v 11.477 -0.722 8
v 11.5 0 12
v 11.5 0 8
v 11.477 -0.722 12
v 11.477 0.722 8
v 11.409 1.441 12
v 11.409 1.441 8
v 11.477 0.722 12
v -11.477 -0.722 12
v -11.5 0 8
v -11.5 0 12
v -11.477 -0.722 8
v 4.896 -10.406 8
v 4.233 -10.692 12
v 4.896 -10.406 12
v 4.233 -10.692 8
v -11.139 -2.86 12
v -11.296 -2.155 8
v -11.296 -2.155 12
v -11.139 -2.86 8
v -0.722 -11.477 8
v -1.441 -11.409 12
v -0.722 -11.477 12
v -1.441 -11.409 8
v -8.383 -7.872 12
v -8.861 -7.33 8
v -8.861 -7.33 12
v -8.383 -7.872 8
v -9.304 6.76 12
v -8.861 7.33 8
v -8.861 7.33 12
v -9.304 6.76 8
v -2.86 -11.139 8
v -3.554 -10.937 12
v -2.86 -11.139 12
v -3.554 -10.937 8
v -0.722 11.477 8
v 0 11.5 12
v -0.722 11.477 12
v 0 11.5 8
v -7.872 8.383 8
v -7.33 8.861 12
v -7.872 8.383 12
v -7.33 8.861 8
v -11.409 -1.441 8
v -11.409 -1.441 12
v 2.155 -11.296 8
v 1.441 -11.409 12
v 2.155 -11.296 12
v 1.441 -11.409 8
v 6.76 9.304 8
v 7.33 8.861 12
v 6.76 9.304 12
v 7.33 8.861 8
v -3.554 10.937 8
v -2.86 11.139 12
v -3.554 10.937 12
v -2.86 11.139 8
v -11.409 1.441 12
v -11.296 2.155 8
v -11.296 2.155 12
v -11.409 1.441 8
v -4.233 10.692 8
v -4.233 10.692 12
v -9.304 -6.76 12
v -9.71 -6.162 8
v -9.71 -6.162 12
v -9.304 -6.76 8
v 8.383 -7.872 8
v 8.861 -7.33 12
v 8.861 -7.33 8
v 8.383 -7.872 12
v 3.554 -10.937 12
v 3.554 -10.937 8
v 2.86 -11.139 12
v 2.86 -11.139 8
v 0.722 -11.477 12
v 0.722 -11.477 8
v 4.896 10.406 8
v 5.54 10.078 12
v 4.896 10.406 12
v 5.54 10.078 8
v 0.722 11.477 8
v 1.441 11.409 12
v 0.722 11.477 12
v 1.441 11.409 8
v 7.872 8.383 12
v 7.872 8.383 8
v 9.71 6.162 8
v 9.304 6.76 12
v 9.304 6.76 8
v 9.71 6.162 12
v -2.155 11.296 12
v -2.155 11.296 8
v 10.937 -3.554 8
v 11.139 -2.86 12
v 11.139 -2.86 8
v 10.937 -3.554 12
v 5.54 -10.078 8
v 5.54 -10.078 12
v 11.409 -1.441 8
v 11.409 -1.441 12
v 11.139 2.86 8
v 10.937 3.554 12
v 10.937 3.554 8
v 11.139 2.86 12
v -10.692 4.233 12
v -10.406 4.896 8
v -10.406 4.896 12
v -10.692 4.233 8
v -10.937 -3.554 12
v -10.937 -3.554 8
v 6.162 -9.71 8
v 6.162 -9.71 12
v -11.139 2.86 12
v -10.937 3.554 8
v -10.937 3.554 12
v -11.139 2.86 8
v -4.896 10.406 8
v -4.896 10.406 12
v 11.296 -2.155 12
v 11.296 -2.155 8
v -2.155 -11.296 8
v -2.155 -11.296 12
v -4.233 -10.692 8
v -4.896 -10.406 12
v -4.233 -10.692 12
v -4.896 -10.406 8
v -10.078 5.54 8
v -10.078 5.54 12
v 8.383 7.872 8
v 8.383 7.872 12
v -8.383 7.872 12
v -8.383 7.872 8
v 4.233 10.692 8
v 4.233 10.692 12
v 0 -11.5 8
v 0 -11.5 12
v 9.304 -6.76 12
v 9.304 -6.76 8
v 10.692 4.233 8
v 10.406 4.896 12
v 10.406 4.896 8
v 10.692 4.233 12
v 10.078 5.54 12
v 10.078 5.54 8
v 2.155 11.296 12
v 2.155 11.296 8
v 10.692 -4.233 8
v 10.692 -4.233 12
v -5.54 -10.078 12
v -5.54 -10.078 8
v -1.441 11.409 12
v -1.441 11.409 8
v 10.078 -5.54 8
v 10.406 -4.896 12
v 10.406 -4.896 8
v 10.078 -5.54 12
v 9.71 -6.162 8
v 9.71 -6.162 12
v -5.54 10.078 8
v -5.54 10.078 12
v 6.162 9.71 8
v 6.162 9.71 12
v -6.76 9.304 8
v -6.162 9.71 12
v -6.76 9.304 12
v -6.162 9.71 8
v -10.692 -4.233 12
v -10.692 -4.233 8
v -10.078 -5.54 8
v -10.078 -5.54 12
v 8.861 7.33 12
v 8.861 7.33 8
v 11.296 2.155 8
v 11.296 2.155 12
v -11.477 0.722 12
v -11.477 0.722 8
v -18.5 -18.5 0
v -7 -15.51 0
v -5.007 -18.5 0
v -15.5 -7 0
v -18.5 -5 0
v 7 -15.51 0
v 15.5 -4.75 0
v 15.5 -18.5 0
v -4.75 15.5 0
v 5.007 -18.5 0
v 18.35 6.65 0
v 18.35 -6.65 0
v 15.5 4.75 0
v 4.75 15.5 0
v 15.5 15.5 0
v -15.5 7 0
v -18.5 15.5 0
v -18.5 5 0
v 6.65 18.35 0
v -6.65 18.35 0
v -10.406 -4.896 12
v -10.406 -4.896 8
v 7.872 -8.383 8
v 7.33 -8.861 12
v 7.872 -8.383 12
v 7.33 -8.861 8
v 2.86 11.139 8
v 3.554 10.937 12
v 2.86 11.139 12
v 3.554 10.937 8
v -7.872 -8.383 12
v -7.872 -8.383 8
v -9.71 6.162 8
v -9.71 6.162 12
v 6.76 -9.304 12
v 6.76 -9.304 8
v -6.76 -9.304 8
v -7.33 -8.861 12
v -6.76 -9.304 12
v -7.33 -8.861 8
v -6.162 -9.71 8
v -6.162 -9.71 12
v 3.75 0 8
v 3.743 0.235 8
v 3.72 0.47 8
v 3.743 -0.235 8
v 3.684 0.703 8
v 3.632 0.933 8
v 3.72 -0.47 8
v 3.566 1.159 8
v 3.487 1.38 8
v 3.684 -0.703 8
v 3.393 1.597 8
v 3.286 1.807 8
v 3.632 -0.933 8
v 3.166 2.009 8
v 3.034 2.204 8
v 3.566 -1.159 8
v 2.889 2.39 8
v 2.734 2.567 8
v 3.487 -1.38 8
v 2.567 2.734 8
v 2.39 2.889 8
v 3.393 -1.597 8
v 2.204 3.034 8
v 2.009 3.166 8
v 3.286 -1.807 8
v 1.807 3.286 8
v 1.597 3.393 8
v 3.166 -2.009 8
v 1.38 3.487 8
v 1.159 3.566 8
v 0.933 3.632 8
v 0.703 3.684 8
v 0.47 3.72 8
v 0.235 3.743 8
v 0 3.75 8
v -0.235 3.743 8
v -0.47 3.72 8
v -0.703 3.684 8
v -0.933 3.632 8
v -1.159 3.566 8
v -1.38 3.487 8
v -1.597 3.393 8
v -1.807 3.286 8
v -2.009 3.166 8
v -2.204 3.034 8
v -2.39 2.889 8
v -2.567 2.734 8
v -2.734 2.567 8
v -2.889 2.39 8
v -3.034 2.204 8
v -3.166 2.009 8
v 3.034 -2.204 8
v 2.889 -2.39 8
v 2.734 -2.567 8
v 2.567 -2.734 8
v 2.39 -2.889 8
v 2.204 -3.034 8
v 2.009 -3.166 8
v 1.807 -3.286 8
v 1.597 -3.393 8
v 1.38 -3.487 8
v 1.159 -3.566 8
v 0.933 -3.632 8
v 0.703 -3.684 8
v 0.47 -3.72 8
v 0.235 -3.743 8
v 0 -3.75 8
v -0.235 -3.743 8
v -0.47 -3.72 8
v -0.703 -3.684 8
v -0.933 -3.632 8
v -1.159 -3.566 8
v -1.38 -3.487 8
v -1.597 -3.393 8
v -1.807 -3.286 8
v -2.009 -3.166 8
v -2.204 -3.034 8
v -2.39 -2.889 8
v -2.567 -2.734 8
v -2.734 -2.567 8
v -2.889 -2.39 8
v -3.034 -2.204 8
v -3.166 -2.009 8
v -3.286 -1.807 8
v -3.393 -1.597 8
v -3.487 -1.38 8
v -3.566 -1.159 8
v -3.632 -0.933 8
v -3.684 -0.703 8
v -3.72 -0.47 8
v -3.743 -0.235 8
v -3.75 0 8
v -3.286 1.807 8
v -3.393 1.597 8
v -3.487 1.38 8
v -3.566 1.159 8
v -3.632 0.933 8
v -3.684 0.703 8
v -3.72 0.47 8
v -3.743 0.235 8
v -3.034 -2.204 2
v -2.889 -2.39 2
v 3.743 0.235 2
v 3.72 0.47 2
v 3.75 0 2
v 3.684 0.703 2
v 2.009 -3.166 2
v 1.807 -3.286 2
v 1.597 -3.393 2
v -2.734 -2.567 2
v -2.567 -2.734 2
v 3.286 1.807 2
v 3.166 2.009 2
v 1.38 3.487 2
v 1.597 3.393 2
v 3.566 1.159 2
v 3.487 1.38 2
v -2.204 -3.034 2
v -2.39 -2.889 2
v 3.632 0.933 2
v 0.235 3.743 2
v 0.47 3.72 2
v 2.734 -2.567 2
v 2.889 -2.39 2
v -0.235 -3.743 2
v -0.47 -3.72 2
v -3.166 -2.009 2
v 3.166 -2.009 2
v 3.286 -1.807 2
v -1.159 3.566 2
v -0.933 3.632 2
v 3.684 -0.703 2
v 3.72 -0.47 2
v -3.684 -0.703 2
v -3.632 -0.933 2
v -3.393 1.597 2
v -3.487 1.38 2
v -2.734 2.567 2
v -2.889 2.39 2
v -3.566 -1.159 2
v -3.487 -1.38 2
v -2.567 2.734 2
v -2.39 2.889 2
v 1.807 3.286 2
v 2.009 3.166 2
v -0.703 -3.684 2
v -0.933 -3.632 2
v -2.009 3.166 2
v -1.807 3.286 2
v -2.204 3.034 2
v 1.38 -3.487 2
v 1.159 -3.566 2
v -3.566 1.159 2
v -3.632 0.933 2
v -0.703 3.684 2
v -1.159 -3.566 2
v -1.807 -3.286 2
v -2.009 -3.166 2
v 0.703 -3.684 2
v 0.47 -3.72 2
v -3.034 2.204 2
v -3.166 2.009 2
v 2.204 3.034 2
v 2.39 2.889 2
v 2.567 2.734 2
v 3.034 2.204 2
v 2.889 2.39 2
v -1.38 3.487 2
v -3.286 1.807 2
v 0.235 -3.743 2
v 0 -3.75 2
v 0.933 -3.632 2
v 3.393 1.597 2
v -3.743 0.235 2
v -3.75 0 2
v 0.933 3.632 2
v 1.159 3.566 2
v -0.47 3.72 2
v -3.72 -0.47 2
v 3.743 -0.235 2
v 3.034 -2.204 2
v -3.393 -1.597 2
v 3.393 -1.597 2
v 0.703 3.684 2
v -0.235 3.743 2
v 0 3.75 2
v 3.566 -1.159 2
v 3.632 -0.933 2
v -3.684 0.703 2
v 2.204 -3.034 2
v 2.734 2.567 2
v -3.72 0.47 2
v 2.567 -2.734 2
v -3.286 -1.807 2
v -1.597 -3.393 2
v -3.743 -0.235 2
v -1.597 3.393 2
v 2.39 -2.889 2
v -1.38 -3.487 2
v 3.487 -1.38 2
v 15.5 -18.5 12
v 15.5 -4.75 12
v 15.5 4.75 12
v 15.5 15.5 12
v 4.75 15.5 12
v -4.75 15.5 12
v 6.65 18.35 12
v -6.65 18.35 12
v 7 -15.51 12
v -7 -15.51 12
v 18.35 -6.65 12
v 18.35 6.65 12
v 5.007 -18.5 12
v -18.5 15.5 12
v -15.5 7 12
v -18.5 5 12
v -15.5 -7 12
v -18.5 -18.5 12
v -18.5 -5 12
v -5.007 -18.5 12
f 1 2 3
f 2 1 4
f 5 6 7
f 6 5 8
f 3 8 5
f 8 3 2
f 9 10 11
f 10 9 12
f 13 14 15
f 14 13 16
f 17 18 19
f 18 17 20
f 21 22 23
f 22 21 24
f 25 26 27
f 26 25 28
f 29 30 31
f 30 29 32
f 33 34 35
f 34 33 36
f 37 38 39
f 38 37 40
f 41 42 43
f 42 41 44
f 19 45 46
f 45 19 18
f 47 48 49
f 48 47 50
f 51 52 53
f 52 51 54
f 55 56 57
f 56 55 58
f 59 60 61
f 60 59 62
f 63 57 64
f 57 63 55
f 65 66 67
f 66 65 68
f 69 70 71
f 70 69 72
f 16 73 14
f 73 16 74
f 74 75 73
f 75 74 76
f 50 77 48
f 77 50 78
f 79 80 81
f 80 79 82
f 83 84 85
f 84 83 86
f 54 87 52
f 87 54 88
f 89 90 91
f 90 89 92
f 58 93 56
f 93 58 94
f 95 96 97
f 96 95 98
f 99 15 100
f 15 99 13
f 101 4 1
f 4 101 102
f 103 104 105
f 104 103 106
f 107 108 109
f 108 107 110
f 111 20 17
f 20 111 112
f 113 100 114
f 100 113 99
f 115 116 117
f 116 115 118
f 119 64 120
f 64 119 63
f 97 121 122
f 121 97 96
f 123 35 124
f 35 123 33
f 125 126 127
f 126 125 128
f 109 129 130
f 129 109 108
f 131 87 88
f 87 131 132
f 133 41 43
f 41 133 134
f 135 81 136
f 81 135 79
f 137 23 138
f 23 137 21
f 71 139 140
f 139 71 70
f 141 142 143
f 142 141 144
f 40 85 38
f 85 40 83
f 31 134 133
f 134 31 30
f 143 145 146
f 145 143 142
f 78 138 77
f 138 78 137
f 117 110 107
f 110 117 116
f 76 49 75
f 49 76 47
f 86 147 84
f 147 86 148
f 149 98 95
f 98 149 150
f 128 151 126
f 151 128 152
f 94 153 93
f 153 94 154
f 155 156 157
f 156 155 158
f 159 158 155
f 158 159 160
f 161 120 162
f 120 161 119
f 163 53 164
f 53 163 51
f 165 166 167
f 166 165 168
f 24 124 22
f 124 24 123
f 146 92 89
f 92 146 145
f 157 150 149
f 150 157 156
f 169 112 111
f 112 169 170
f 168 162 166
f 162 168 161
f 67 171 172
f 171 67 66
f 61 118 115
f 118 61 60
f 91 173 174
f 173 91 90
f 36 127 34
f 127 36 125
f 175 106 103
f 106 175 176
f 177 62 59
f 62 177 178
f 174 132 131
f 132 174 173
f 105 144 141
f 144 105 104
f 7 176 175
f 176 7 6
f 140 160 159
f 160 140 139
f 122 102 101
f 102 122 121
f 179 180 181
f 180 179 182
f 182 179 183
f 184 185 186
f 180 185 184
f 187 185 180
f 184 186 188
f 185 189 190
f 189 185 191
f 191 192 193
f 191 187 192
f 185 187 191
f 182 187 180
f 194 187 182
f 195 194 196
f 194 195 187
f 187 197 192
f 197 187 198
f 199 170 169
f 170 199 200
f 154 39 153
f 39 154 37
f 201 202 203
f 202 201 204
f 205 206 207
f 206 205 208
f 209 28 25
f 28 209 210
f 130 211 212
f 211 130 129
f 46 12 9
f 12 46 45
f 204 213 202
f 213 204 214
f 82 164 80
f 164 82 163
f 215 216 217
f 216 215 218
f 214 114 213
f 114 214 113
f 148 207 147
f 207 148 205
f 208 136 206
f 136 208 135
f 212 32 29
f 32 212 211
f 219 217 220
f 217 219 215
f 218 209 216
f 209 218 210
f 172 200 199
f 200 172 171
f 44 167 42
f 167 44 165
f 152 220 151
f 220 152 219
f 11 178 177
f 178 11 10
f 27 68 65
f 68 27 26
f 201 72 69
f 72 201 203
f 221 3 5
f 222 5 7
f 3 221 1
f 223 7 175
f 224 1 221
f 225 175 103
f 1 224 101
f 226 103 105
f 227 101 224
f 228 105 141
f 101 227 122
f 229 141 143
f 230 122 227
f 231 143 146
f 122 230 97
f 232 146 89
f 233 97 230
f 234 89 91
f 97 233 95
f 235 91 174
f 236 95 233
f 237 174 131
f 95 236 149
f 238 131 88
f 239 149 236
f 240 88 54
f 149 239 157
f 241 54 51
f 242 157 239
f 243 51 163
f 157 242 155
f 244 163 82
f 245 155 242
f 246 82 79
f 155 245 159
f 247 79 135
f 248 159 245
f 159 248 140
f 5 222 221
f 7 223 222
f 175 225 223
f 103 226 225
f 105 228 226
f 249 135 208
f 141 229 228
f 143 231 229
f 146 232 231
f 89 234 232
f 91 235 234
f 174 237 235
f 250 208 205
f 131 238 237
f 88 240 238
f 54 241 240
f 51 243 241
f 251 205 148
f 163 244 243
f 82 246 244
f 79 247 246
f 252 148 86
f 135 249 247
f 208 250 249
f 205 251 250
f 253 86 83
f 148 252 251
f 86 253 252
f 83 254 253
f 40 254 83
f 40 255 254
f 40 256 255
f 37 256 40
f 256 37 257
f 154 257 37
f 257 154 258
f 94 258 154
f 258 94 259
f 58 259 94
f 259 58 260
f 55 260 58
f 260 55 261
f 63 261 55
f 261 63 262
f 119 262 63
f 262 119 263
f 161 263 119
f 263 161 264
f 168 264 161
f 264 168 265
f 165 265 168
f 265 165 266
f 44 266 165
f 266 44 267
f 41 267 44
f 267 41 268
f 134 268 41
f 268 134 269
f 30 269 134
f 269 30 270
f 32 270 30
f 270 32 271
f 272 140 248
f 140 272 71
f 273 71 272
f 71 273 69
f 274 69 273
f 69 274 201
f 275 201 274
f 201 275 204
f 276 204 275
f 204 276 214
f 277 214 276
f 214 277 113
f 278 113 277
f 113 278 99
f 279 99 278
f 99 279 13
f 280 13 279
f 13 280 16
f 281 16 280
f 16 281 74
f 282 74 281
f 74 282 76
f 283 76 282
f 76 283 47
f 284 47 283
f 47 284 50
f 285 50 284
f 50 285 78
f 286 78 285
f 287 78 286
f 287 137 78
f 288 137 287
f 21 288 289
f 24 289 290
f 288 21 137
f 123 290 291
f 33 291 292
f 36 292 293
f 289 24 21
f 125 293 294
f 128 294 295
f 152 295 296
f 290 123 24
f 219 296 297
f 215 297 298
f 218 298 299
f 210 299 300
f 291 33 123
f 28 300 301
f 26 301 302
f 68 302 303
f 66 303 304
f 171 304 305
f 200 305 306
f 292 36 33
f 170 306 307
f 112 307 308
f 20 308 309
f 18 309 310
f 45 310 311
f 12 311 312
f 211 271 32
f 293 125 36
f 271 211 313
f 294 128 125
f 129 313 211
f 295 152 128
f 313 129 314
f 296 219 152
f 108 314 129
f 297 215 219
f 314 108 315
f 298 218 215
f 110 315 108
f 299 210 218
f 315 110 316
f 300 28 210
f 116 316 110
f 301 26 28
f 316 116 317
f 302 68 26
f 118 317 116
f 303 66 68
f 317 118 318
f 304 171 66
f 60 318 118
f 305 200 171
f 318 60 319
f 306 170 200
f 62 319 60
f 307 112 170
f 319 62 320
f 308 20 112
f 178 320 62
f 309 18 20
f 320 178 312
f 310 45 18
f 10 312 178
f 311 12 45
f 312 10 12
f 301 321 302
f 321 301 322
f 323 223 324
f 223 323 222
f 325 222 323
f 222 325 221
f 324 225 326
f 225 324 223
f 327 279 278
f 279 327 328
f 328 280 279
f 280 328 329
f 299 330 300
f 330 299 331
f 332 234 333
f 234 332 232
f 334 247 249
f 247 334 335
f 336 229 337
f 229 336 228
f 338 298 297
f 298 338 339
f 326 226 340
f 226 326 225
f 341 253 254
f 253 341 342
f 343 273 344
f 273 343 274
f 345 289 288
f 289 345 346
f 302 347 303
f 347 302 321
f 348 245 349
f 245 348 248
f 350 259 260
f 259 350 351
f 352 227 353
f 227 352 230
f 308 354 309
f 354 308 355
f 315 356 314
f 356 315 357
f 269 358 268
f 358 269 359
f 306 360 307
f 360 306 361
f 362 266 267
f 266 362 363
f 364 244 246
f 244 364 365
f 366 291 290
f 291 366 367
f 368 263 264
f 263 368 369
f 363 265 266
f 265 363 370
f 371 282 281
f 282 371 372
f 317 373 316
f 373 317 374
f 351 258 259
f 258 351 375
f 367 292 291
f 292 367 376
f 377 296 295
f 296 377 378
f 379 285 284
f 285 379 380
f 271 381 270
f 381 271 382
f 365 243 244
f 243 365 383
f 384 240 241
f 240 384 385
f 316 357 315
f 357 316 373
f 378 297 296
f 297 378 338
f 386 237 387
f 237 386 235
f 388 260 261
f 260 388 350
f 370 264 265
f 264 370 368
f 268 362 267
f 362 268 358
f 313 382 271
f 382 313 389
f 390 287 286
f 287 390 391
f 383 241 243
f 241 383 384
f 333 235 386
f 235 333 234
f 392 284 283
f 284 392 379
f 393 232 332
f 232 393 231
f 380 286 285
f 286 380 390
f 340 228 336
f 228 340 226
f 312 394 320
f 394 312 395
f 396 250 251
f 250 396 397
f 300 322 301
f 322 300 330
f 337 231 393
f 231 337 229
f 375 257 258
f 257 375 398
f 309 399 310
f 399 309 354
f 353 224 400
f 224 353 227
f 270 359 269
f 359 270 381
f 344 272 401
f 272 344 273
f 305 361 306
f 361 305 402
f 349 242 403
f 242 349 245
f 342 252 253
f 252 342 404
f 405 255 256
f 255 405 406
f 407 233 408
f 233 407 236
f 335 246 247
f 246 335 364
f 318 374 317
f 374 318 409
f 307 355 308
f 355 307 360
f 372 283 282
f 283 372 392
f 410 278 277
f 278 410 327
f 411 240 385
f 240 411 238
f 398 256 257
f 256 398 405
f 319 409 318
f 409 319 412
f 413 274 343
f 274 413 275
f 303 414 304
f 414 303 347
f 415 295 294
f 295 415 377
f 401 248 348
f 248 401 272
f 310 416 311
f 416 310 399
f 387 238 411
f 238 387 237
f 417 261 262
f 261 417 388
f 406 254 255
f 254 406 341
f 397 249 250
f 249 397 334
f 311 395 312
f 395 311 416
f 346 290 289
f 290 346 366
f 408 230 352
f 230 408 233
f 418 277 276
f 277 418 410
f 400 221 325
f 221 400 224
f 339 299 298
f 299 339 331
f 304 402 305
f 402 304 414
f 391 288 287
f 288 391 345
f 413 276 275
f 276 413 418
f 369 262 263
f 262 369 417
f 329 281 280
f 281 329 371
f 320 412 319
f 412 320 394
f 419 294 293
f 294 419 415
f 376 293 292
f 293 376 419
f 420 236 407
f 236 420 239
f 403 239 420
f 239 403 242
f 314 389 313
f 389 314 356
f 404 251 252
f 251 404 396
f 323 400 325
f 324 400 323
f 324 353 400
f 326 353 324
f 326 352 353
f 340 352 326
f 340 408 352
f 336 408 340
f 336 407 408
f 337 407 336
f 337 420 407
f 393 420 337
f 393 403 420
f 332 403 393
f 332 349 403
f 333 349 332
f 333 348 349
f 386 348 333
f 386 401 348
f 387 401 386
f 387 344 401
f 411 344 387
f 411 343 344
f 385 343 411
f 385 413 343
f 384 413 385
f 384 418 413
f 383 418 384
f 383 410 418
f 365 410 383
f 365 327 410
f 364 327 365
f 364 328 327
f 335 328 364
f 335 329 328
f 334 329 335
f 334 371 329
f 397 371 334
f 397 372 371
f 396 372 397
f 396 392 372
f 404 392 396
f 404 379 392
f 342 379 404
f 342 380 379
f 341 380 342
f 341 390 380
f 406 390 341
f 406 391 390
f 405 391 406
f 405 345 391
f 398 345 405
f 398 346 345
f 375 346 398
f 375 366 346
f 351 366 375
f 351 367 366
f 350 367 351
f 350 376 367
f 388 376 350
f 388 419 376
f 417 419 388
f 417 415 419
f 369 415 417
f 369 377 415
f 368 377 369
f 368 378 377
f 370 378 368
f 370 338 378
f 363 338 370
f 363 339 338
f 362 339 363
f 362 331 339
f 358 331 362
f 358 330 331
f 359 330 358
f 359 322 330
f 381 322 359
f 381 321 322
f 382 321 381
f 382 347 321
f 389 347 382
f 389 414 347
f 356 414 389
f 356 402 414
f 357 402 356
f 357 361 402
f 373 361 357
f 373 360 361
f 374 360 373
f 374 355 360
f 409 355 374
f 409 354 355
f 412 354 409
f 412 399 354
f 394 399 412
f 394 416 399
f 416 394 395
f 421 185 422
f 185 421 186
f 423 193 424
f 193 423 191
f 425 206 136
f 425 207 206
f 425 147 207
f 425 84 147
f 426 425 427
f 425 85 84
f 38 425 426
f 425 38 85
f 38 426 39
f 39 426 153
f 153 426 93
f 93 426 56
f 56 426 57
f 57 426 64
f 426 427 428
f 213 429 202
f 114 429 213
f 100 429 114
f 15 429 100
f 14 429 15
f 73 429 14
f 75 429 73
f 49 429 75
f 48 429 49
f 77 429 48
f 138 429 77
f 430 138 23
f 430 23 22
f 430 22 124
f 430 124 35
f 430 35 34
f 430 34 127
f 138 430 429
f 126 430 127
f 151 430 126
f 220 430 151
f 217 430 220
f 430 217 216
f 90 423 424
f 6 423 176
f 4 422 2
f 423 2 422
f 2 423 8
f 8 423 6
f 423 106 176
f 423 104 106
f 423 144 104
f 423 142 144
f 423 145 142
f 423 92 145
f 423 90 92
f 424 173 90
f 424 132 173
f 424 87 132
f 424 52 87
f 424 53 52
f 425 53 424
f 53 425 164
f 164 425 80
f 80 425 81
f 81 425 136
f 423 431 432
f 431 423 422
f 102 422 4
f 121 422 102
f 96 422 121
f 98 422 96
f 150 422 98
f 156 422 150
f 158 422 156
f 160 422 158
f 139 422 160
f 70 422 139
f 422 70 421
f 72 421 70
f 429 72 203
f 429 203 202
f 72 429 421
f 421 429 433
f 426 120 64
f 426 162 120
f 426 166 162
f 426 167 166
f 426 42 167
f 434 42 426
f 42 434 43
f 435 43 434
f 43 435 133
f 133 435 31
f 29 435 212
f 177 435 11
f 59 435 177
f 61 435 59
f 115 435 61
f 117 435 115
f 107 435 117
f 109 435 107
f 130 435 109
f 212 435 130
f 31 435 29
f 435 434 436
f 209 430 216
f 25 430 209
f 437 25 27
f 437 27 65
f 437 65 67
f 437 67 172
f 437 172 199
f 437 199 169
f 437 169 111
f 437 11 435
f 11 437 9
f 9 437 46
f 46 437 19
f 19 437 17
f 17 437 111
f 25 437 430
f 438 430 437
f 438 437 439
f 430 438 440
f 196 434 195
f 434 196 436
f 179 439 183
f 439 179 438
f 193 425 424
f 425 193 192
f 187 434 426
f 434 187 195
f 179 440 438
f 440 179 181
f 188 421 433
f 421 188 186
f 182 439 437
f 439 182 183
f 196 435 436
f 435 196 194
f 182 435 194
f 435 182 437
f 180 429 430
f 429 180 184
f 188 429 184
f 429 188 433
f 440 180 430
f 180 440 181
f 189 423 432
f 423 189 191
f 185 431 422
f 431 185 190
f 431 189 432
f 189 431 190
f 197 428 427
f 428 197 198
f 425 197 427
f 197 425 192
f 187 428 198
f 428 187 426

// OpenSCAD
// Center piece is the middle cylinder
// Outer piece is the square shell with interlocks
center_piece();
outer_piece();

AtomizerSize = 22;

_InternalAtomizerSize = AtomizerSize + 1;

module center_piece() {
  difference() {
    cylinder(h=8, d=_InternalAtomizerSize, $fn=100);
    translate([0, 0, 2]) cylinder(h=6, d=7.5, $fn=100);
  }
}

module outer_piece() {
  difference() {
    translate([-18.5, -18.5, 0]) cube(size=[34, 34, 12]);
    cylinder(h=12, d=_InternalAtomizerSize, $fn=100);
    translate([-18.5, 0, 0]) trap();
    translate([0, -18.51, 0]) rotate(90) trap();
  }
  translate([15.5, 0, 0]) scale([0.95, 0.95, 1]) trap();
  translate([0, 15.5, 0]) rotate(90) scale([0.95, 0.95, 1]) trap();
}

module trap() {
  polyhedron(points = [[0, 5, 0], [3, 7, 0],
      [3, -7, 0], [0, -5, 0], [0, 5, 12], [3, 7, 12],
      [3, -7, 12], [0, -5, 12]],
      faces = [[3, 2, 1, 0], [4, 5, 6, 7],
      [0, 1, 5, 4], [1, 2, 6, 5], [2, 3, 7, 6],
      [3, 0, 4, 7]]);
}
 
